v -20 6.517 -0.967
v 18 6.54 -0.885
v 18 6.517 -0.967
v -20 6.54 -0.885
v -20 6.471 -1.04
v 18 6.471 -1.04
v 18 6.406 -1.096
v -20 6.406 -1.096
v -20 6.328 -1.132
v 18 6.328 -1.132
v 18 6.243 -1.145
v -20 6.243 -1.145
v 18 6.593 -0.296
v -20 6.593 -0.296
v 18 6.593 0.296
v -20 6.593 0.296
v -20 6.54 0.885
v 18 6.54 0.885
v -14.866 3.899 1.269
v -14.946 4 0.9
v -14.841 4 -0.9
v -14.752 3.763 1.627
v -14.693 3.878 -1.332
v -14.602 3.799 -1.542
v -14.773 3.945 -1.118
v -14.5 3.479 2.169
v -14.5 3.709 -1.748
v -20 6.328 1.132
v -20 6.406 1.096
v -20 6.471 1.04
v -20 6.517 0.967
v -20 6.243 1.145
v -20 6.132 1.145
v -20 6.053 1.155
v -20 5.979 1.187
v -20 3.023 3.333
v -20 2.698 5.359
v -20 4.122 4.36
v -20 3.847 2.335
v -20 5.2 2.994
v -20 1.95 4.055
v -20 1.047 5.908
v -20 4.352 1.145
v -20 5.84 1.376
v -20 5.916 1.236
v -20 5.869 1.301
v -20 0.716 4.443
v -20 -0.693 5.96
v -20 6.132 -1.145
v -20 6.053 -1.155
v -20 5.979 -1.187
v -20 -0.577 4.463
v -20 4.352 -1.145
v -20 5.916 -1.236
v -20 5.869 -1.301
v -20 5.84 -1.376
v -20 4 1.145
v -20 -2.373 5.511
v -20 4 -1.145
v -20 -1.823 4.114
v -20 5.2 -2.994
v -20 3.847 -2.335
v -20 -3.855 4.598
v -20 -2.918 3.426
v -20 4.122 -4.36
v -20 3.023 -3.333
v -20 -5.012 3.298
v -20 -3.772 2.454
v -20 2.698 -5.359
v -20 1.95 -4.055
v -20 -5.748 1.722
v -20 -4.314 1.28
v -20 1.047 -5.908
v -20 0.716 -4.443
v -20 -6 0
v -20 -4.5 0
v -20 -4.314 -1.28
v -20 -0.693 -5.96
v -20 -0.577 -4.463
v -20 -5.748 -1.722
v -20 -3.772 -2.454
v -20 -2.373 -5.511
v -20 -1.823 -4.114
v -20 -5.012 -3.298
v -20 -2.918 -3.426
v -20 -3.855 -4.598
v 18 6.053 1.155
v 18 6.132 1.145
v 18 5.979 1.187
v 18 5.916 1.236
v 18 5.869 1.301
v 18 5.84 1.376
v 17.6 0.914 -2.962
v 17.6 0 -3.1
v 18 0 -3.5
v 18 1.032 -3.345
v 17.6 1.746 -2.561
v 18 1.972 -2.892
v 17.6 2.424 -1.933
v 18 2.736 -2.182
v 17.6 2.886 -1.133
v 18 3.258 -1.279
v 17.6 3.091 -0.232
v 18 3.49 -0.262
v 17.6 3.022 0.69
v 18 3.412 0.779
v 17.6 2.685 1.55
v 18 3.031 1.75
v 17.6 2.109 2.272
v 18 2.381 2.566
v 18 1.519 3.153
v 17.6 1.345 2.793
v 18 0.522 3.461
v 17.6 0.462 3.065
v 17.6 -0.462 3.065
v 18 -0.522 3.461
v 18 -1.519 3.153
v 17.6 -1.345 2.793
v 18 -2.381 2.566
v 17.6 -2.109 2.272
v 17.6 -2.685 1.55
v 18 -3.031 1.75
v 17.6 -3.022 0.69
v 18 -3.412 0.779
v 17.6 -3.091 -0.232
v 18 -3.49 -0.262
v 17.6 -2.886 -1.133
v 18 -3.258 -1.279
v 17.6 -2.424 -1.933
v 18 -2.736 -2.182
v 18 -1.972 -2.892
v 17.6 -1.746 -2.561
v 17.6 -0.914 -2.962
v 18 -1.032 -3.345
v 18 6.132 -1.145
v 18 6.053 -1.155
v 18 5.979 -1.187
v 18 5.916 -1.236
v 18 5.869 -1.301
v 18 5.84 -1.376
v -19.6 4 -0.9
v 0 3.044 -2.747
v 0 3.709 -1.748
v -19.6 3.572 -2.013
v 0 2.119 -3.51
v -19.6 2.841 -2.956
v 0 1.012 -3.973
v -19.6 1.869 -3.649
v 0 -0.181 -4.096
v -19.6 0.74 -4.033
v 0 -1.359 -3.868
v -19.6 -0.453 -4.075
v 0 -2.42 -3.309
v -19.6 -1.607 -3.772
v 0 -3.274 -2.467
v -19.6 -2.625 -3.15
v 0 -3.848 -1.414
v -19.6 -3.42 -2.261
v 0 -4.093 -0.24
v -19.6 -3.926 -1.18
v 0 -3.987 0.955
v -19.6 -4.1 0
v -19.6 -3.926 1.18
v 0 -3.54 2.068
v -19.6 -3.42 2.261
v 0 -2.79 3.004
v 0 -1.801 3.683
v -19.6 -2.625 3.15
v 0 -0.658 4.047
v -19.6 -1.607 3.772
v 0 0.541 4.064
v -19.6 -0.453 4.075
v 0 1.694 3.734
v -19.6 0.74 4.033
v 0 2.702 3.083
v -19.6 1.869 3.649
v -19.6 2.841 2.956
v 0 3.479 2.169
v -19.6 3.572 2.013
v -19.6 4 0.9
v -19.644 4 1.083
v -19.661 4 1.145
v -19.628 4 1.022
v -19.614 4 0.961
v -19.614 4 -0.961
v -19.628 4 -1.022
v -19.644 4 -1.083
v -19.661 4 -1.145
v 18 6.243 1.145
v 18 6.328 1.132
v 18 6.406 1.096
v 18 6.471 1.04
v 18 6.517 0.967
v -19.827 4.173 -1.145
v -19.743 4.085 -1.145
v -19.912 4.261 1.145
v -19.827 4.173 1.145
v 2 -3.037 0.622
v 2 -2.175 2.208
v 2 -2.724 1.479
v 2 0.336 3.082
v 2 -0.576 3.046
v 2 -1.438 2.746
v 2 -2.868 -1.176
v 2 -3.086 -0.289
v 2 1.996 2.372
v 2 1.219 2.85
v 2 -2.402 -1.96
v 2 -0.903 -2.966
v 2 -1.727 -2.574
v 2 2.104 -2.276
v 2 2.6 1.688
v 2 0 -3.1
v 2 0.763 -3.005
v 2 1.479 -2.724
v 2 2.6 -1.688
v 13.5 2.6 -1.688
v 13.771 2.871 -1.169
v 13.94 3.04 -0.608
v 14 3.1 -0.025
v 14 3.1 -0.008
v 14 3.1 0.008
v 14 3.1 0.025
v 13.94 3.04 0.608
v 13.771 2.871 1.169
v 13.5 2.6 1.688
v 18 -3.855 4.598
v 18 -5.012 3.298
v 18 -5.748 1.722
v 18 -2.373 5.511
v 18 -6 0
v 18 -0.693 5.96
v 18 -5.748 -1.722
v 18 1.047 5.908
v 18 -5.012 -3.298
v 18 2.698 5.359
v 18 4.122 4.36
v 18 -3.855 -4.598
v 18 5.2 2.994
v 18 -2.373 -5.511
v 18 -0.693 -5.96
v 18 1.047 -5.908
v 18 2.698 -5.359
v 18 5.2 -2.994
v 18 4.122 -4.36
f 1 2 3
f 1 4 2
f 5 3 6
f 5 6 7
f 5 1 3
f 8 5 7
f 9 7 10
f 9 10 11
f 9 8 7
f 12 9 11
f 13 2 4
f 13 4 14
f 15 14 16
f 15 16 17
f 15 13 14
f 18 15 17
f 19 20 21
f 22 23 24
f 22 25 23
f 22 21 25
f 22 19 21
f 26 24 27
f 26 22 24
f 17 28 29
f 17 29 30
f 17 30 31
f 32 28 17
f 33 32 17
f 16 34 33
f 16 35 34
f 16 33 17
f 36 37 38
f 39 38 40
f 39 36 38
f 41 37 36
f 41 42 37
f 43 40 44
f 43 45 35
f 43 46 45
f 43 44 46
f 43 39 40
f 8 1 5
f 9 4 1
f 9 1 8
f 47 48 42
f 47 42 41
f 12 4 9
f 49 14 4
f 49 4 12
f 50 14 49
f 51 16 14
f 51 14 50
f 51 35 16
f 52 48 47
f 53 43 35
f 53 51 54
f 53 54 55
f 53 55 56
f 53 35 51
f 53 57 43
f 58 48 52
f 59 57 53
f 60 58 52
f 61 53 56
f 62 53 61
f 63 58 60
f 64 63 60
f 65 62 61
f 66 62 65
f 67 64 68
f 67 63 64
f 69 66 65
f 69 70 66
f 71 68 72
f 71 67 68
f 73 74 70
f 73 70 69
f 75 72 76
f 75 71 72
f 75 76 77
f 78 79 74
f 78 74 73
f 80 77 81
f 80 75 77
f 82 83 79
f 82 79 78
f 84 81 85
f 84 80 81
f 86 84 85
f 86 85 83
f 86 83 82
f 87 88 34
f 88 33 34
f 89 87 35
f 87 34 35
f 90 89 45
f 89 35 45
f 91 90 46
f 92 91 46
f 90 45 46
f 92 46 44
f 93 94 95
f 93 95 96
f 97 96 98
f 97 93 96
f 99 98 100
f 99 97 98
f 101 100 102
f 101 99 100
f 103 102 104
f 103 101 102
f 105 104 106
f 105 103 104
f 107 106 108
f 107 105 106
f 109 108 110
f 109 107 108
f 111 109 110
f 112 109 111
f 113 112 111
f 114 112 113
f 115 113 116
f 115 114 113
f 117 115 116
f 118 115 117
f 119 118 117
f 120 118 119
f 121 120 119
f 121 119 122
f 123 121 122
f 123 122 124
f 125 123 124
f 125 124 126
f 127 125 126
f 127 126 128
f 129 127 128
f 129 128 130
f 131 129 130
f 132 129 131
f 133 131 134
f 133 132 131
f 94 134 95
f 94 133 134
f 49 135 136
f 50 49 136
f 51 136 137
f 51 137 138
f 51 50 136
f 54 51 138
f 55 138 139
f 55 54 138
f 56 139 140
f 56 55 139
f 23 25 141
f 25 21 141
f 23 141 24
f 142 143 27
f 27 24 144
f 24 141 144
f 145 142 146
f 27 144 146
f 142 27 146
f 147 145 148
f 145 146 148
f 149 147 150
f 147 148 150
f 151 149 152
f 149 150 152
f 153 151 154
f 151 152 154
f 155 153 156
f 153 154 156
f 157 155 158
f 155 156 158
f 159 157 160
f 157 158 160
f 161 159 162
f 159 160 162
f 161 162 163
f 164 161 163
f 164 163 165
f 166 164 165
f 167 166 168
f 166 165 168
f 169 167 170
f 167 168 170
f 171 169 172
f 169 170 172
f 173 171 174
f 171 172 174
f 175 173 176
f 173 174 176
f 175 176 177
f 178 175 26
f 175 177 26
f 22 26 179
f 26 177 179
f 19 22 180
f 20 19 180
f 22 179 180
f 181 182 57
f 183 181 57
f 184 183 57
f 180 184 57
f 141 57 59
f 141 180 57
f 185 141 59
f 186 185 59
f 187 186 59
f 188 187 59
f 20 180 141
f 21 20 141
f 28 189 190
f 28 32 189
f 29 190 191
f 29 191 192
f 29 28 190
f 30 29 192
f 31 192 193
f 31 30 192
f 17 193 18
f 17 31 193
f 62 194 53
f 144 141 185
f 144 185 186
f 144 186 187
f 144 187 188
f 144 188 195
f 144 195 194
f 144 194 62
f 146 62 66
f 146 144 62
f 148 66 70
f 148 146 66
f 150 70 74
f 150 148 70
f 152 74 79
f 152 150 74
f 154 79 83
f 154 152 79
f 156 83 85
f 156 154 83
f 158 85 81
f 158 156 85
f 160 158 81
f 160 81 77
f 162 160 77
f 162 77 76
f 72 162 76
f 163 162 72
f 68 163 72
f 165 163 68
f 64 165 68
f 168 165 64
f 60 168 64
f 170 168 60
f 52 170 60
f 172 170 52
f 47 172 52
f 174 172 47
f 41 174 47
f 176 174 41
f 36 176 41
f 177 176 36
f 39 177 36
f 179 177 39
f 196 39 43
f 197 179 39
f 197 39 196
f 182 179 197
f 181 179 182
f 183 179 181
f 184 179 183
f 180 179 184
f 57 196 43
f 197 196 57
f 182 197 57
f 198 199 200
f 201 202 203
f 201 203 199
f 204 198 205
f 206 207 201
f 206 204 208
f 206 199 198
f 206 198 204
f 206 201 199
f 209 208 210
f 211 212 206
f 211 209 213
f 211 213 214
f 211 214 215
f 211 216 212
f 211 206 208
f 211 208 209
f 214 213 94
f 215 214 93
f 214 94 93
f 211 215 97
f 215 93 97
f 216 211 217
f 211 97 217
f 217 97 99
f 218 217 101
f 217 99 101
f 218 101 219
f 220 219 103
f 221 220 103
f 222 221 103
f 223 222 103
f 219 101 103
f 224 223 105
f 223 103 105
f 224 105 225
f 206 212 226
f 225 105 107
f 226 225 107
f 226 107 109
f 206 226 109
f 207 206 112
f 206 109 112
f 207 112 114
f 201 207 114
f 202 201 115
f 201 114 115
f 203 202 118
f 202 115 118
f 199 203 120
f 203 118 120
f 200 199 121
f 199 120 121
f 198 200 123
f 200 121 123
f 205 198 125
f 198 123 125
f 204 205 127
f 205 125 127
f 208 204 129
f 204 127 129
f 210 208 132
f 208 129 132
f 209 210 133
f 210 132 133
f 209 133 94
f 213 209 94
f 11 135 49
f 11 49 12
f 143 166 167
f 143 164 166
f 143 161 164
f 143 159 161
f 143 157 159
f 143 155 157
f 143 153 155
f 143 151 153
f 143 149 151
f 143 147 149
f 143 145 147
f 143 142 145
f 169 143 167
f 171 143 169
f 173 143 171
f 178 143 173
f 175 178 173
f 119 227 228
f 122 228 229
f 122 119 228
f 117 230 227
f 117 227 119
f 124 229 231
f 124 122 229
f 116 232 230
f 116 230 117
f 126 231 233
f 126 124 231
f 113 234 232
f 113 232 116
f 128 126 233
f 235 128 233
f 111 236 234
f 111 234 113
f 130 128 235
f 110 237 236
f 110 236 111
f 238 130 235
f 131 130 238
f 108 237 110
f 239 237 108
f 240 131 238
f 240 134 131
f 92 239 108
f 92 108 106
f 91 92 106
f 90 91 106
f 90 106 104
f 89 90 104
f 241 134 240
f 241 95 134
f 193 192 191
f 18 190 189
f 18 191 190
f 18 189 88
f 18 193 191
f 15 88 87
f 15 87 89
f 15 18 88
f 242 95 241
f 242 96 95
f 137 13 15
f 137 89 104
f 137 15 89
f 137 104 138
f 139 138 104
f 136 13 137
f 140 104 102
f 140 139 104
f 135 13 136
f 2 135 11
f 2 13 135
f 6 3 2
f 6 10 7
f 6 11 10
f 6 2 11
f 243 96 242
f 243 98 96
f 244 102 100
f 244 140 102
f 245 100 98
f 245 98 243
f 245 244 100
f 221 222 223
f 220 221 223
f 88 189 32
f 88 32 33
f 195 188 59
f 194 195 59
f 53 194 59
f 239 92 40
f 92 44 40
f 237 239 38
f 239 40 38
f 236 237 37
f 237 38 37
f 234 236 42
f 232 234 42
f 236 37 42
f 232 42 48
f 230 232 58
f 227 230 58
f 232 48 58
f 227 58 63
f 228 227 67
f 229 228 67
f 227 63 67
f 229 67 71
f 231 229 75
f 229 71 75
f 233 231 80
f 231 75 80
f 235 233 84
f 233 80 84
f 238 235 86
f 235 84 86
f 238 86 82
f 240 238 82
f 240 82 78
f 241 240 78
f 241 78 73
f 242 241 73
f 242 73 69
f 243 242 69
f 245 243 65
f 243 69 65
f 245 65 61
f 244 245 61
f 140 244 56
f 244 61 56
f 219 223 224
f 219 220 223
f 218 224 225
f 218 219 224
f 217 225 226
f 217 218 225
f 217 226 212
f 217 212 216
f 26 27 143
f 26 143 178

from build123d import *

# Parameters (mm, degrees)
EXTRUDE_1_DEPTH      = 18
EXTRUDE_1_DEPTH_BACK = 20
SKETCH_1_R           = 6
SKETCH_3_R           = 3.1
CUT_EXTRUDE_1_DEPTH  = 16
SKETCH_4_R           = 4.1
CUT_EXTRUDE_2_DEPTH  = 20
EXTRUDE_START        = 12
EXTRUDE_2_DEPTH      = 12
EXTRUDE_START_2      = 15
EXTRUDE_3_DEPTH      = 15
CHAMFER_1_SIZE       = 0.4
CHAMFER_2_SIZE       = 0.5
EXTRUDE_4_REACH      = 40.936
FILLET_1_R           = 0.3


with BuildPart() as part:
    # 草图1 → 凸台-拉伸1 (new, two sides: drawn at the far end of the back side and taken through both)
    with BuildSketch(Plane(origin=(0, 0, 0), x_dir=(0, 0, -1), z_dir=(1, 0, 0)).offset(-EXTRUDE_1_DEPTH_BACK)):
        Circle(SKETCH_1_R)
    extrude(amount=EXTRUDE_1_DEPTH + EXTRUDE_1_DEPTH_BACK)

    # 草图3 → 切除-拉伸1 (cut)
    with BuildSketch(Plane(origin=(18, 0, 0), x_dir=(0, 0, -1), z_dir=(1, 0, 0))):
        Circle(SKETCH_3_R)
    extrude(amount=-CUT_EXTRUDE_1_DEPTH, mode=Mode.SUBTRACT)

    # 草图4 → 切除-拉伸2 (cut)
    with BuildSketch(Plane.ZY.offset(20)):
        Circle(SKETCH_4_R)
    extrude(amount=-CUT_EXTRUDE_2_DEPTH, mode=Mode.SUBTRACT)

    # 草图5 → 凸台-拉伸2 (add)
    with BuildSketch(Plane(origin=(2, 0, 0), x_dir=(0, 0, -1), z_dir=(1, 0, 0)).offset(EXTRUDE_START)):
        with BuildLine():
            Line((-1.688194302, 2.6), (1.688194302, 2.6))
            ThreePointArc((1.688194302, 2.6), (0, 3.1), (-1.688194302, 2.6))
        make_face()
    extrude(amount=-EXTRUDE_2_DEPTH)

    # 草图6 → 凸台-拉伸3 (add)
    with BuildSketch(Plane.ZY.offset(EXTRUDE_START_2)):
        with BuildLine():
            Line((-1.748205844, 3.708608408), (2.169358352, 3.479063716))
            ThreePointArc((2.169358352, 3.479063716), (0.239822956, 4.09297996), (-1.748205844, 3.708608408))
        make_face()
    extrude(amount=-EXTRUDE_3_DEPTH)

    # 倒角1
    chamfer_1_edges = [part.edges().sort_by_distance(p)[0] for p in [
        (-20, 0, -4.1),
        (18, 0, 3.1),
    ]]
    chamfer(chamfer_1_edges, length=CHAMFER_1_SIZE)

    # 倒角2
    chamfer_2_edges = [part.edges().sort_by_distance(p)[0] for p in [
        (-15, 3.593836062, 0.210576254),
        (14, 2.6, 0),
    ]]
    chamfer(chamfer_2_edges, length=CHAMFER_2_SIZE - 0.0001)  # a hair under: the kernel refuses the full size

    # 凸台-拉伸4: up to this face of the body (flat: up to its plane)
    extrude_4_end = Plane(part.part.faces().sort_by_distance((-20, 0, -4.669705627))[0])
    # 草图7 → 凸台-拉伸4 (add, up to the picked face)
    with BuildSketch(Plane(origin=(18, 0, 0), x_dir=(0, 0, -1), z_dir=(1, 0, 0)), mode=Mode.PRIVATE) as extrude_4_sk1:
        with BuildLine():
            Line((-1.144552314, 6.5), (-1.144552314, 4))
            Line((-1.144552314, 4), (1.144552314, 4))
            Line((1.144552314, 4), (1.144552314, 6.5))
            ThreePointArc((1.144552314, 6.5), (0, 6.6), (-1.144552314, 6.5))
        make_face()
    extrude_4_tool1 = split(extrude(extrude_4_sk1.sketch, amount=-EXTRUDE_4_REACH, mode=Mode.PRIVATE), bisect_by=extrude_4_end, keep=Keep.BOTH, mode=Mode.PRIVATE)
    add(extrude_4_tool1.solids().sort_by(Axis((18, 5.283557, 0), (-1, 0, 0)))[0])

    # 圆角1
    fillet_1_edges = [part.edges().sort_by_distance(p)[0] for p in [
        (-1, 5.889821729, -1.144552314),
        (-1, 6.5, -1.144552314),
        (-1, 5.889821729, 1.144552314),
        (-1, 6.5, 1.144552314),
    ]]
    fillet(fillet_1_edges, radius=FILLET_1_R)


solid = part.part
